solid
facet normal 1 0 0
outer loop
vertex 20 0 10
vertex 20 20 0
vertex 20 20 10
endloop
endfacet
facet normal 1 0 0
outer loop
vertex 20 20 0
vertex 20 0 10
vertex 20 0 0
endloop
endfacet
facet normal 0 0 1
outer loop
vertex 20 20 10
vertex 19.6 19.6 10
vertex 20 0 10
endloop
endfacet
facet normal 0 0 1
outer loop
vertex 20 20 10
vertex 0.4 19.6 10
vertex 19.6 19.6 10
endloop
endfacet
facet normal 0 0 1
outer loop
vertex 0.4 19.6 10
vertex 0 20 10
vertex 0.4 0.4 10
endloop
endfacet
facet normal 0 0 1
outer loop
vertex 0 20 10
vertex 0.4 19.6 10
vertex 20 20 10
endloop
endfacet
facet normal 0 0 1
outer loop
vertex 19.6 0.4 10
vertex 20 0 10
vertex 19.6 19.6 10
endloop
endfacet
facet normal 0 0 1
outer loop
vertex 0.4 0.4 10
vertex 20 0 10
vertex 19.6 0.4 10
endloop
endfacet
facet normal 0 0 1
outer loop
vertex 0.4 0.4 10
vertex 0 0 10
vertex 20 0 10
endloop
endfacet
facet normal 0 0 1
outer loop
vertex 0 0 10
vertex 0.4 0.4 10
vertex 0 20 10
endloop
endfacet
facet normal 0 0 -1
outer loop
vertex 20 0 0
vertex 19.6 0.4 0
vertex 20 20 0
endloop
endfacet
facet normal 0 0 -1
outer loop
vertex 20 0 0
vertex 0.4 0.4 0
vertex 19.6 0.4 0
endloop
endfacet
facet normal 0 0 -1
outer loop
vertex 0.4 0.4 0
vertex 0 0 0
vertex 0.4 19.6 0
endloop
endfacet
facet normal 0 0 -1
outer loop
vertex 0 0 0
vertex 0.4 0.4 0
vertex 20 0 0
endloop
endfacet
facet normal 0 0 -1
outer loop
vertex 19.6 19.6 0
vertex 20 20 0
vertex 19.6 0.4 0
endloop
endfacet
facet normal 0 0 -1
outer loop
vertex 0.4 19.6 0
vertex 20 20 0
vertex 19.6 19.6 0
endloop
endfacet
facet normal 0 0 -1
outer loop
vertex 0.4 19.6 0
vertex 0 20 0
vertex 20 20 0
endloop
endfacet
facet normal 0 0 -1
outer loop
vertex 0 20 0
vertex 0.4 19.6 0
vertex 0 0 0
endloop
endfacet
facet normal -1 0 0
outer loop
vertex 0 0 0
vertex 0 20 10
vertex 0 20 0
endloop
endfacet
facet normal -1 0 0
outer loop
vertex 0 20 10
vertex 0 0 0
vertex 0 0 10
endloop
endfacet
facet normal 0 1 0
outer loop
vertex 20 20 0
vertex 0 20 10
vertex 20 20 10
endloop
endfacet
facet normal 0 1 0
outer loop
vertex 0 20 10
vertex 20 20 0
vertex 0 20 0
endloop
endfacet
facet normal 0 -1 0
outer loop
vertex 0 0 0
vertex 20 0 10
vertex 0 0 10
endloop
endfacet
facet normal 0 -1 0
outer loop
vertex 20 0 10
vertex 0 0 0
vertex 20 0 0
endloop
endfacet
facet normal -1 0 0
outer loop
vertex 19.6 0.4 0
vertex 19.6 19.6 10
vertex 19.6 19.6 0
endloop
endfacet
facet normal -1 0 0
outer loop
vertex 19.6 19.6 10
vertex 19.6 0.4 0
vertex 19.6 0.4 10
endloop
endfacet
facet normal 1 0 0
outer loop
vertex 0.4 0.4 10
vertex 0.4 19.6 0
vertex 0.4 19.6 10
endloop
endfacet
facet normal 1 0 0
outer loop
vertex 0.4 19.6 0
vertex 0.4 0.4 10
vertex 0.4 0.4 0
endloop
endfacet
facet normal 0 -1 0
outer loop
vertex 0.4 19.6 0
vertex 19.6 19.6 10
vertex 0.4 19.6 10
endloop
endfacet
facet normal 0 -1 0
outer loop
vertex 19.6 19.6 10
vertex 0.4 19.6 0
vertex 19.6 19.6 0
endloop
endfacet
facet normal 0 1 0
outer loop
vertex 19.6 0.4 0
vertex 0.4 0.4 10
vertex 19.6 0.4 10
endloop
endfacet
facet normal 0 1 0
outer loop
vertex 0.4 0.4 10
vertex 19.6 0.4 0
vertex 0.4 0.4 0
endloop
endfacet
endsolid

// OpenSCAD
/* [Cube] */

height = 10; 
length = 20; 
width = 20; 

/* [Nozzle] */

thickness = 0.4; //[0.1,0.2,0.25,0.3,0.35,0.4,0.5,0.6,0.8]

difference() {
	cube([length,width,height]);
	translate([thickness,thickness,-1]) {
		cube([length-2*thickness,width-2*thickness,height+2]);
	}
}
